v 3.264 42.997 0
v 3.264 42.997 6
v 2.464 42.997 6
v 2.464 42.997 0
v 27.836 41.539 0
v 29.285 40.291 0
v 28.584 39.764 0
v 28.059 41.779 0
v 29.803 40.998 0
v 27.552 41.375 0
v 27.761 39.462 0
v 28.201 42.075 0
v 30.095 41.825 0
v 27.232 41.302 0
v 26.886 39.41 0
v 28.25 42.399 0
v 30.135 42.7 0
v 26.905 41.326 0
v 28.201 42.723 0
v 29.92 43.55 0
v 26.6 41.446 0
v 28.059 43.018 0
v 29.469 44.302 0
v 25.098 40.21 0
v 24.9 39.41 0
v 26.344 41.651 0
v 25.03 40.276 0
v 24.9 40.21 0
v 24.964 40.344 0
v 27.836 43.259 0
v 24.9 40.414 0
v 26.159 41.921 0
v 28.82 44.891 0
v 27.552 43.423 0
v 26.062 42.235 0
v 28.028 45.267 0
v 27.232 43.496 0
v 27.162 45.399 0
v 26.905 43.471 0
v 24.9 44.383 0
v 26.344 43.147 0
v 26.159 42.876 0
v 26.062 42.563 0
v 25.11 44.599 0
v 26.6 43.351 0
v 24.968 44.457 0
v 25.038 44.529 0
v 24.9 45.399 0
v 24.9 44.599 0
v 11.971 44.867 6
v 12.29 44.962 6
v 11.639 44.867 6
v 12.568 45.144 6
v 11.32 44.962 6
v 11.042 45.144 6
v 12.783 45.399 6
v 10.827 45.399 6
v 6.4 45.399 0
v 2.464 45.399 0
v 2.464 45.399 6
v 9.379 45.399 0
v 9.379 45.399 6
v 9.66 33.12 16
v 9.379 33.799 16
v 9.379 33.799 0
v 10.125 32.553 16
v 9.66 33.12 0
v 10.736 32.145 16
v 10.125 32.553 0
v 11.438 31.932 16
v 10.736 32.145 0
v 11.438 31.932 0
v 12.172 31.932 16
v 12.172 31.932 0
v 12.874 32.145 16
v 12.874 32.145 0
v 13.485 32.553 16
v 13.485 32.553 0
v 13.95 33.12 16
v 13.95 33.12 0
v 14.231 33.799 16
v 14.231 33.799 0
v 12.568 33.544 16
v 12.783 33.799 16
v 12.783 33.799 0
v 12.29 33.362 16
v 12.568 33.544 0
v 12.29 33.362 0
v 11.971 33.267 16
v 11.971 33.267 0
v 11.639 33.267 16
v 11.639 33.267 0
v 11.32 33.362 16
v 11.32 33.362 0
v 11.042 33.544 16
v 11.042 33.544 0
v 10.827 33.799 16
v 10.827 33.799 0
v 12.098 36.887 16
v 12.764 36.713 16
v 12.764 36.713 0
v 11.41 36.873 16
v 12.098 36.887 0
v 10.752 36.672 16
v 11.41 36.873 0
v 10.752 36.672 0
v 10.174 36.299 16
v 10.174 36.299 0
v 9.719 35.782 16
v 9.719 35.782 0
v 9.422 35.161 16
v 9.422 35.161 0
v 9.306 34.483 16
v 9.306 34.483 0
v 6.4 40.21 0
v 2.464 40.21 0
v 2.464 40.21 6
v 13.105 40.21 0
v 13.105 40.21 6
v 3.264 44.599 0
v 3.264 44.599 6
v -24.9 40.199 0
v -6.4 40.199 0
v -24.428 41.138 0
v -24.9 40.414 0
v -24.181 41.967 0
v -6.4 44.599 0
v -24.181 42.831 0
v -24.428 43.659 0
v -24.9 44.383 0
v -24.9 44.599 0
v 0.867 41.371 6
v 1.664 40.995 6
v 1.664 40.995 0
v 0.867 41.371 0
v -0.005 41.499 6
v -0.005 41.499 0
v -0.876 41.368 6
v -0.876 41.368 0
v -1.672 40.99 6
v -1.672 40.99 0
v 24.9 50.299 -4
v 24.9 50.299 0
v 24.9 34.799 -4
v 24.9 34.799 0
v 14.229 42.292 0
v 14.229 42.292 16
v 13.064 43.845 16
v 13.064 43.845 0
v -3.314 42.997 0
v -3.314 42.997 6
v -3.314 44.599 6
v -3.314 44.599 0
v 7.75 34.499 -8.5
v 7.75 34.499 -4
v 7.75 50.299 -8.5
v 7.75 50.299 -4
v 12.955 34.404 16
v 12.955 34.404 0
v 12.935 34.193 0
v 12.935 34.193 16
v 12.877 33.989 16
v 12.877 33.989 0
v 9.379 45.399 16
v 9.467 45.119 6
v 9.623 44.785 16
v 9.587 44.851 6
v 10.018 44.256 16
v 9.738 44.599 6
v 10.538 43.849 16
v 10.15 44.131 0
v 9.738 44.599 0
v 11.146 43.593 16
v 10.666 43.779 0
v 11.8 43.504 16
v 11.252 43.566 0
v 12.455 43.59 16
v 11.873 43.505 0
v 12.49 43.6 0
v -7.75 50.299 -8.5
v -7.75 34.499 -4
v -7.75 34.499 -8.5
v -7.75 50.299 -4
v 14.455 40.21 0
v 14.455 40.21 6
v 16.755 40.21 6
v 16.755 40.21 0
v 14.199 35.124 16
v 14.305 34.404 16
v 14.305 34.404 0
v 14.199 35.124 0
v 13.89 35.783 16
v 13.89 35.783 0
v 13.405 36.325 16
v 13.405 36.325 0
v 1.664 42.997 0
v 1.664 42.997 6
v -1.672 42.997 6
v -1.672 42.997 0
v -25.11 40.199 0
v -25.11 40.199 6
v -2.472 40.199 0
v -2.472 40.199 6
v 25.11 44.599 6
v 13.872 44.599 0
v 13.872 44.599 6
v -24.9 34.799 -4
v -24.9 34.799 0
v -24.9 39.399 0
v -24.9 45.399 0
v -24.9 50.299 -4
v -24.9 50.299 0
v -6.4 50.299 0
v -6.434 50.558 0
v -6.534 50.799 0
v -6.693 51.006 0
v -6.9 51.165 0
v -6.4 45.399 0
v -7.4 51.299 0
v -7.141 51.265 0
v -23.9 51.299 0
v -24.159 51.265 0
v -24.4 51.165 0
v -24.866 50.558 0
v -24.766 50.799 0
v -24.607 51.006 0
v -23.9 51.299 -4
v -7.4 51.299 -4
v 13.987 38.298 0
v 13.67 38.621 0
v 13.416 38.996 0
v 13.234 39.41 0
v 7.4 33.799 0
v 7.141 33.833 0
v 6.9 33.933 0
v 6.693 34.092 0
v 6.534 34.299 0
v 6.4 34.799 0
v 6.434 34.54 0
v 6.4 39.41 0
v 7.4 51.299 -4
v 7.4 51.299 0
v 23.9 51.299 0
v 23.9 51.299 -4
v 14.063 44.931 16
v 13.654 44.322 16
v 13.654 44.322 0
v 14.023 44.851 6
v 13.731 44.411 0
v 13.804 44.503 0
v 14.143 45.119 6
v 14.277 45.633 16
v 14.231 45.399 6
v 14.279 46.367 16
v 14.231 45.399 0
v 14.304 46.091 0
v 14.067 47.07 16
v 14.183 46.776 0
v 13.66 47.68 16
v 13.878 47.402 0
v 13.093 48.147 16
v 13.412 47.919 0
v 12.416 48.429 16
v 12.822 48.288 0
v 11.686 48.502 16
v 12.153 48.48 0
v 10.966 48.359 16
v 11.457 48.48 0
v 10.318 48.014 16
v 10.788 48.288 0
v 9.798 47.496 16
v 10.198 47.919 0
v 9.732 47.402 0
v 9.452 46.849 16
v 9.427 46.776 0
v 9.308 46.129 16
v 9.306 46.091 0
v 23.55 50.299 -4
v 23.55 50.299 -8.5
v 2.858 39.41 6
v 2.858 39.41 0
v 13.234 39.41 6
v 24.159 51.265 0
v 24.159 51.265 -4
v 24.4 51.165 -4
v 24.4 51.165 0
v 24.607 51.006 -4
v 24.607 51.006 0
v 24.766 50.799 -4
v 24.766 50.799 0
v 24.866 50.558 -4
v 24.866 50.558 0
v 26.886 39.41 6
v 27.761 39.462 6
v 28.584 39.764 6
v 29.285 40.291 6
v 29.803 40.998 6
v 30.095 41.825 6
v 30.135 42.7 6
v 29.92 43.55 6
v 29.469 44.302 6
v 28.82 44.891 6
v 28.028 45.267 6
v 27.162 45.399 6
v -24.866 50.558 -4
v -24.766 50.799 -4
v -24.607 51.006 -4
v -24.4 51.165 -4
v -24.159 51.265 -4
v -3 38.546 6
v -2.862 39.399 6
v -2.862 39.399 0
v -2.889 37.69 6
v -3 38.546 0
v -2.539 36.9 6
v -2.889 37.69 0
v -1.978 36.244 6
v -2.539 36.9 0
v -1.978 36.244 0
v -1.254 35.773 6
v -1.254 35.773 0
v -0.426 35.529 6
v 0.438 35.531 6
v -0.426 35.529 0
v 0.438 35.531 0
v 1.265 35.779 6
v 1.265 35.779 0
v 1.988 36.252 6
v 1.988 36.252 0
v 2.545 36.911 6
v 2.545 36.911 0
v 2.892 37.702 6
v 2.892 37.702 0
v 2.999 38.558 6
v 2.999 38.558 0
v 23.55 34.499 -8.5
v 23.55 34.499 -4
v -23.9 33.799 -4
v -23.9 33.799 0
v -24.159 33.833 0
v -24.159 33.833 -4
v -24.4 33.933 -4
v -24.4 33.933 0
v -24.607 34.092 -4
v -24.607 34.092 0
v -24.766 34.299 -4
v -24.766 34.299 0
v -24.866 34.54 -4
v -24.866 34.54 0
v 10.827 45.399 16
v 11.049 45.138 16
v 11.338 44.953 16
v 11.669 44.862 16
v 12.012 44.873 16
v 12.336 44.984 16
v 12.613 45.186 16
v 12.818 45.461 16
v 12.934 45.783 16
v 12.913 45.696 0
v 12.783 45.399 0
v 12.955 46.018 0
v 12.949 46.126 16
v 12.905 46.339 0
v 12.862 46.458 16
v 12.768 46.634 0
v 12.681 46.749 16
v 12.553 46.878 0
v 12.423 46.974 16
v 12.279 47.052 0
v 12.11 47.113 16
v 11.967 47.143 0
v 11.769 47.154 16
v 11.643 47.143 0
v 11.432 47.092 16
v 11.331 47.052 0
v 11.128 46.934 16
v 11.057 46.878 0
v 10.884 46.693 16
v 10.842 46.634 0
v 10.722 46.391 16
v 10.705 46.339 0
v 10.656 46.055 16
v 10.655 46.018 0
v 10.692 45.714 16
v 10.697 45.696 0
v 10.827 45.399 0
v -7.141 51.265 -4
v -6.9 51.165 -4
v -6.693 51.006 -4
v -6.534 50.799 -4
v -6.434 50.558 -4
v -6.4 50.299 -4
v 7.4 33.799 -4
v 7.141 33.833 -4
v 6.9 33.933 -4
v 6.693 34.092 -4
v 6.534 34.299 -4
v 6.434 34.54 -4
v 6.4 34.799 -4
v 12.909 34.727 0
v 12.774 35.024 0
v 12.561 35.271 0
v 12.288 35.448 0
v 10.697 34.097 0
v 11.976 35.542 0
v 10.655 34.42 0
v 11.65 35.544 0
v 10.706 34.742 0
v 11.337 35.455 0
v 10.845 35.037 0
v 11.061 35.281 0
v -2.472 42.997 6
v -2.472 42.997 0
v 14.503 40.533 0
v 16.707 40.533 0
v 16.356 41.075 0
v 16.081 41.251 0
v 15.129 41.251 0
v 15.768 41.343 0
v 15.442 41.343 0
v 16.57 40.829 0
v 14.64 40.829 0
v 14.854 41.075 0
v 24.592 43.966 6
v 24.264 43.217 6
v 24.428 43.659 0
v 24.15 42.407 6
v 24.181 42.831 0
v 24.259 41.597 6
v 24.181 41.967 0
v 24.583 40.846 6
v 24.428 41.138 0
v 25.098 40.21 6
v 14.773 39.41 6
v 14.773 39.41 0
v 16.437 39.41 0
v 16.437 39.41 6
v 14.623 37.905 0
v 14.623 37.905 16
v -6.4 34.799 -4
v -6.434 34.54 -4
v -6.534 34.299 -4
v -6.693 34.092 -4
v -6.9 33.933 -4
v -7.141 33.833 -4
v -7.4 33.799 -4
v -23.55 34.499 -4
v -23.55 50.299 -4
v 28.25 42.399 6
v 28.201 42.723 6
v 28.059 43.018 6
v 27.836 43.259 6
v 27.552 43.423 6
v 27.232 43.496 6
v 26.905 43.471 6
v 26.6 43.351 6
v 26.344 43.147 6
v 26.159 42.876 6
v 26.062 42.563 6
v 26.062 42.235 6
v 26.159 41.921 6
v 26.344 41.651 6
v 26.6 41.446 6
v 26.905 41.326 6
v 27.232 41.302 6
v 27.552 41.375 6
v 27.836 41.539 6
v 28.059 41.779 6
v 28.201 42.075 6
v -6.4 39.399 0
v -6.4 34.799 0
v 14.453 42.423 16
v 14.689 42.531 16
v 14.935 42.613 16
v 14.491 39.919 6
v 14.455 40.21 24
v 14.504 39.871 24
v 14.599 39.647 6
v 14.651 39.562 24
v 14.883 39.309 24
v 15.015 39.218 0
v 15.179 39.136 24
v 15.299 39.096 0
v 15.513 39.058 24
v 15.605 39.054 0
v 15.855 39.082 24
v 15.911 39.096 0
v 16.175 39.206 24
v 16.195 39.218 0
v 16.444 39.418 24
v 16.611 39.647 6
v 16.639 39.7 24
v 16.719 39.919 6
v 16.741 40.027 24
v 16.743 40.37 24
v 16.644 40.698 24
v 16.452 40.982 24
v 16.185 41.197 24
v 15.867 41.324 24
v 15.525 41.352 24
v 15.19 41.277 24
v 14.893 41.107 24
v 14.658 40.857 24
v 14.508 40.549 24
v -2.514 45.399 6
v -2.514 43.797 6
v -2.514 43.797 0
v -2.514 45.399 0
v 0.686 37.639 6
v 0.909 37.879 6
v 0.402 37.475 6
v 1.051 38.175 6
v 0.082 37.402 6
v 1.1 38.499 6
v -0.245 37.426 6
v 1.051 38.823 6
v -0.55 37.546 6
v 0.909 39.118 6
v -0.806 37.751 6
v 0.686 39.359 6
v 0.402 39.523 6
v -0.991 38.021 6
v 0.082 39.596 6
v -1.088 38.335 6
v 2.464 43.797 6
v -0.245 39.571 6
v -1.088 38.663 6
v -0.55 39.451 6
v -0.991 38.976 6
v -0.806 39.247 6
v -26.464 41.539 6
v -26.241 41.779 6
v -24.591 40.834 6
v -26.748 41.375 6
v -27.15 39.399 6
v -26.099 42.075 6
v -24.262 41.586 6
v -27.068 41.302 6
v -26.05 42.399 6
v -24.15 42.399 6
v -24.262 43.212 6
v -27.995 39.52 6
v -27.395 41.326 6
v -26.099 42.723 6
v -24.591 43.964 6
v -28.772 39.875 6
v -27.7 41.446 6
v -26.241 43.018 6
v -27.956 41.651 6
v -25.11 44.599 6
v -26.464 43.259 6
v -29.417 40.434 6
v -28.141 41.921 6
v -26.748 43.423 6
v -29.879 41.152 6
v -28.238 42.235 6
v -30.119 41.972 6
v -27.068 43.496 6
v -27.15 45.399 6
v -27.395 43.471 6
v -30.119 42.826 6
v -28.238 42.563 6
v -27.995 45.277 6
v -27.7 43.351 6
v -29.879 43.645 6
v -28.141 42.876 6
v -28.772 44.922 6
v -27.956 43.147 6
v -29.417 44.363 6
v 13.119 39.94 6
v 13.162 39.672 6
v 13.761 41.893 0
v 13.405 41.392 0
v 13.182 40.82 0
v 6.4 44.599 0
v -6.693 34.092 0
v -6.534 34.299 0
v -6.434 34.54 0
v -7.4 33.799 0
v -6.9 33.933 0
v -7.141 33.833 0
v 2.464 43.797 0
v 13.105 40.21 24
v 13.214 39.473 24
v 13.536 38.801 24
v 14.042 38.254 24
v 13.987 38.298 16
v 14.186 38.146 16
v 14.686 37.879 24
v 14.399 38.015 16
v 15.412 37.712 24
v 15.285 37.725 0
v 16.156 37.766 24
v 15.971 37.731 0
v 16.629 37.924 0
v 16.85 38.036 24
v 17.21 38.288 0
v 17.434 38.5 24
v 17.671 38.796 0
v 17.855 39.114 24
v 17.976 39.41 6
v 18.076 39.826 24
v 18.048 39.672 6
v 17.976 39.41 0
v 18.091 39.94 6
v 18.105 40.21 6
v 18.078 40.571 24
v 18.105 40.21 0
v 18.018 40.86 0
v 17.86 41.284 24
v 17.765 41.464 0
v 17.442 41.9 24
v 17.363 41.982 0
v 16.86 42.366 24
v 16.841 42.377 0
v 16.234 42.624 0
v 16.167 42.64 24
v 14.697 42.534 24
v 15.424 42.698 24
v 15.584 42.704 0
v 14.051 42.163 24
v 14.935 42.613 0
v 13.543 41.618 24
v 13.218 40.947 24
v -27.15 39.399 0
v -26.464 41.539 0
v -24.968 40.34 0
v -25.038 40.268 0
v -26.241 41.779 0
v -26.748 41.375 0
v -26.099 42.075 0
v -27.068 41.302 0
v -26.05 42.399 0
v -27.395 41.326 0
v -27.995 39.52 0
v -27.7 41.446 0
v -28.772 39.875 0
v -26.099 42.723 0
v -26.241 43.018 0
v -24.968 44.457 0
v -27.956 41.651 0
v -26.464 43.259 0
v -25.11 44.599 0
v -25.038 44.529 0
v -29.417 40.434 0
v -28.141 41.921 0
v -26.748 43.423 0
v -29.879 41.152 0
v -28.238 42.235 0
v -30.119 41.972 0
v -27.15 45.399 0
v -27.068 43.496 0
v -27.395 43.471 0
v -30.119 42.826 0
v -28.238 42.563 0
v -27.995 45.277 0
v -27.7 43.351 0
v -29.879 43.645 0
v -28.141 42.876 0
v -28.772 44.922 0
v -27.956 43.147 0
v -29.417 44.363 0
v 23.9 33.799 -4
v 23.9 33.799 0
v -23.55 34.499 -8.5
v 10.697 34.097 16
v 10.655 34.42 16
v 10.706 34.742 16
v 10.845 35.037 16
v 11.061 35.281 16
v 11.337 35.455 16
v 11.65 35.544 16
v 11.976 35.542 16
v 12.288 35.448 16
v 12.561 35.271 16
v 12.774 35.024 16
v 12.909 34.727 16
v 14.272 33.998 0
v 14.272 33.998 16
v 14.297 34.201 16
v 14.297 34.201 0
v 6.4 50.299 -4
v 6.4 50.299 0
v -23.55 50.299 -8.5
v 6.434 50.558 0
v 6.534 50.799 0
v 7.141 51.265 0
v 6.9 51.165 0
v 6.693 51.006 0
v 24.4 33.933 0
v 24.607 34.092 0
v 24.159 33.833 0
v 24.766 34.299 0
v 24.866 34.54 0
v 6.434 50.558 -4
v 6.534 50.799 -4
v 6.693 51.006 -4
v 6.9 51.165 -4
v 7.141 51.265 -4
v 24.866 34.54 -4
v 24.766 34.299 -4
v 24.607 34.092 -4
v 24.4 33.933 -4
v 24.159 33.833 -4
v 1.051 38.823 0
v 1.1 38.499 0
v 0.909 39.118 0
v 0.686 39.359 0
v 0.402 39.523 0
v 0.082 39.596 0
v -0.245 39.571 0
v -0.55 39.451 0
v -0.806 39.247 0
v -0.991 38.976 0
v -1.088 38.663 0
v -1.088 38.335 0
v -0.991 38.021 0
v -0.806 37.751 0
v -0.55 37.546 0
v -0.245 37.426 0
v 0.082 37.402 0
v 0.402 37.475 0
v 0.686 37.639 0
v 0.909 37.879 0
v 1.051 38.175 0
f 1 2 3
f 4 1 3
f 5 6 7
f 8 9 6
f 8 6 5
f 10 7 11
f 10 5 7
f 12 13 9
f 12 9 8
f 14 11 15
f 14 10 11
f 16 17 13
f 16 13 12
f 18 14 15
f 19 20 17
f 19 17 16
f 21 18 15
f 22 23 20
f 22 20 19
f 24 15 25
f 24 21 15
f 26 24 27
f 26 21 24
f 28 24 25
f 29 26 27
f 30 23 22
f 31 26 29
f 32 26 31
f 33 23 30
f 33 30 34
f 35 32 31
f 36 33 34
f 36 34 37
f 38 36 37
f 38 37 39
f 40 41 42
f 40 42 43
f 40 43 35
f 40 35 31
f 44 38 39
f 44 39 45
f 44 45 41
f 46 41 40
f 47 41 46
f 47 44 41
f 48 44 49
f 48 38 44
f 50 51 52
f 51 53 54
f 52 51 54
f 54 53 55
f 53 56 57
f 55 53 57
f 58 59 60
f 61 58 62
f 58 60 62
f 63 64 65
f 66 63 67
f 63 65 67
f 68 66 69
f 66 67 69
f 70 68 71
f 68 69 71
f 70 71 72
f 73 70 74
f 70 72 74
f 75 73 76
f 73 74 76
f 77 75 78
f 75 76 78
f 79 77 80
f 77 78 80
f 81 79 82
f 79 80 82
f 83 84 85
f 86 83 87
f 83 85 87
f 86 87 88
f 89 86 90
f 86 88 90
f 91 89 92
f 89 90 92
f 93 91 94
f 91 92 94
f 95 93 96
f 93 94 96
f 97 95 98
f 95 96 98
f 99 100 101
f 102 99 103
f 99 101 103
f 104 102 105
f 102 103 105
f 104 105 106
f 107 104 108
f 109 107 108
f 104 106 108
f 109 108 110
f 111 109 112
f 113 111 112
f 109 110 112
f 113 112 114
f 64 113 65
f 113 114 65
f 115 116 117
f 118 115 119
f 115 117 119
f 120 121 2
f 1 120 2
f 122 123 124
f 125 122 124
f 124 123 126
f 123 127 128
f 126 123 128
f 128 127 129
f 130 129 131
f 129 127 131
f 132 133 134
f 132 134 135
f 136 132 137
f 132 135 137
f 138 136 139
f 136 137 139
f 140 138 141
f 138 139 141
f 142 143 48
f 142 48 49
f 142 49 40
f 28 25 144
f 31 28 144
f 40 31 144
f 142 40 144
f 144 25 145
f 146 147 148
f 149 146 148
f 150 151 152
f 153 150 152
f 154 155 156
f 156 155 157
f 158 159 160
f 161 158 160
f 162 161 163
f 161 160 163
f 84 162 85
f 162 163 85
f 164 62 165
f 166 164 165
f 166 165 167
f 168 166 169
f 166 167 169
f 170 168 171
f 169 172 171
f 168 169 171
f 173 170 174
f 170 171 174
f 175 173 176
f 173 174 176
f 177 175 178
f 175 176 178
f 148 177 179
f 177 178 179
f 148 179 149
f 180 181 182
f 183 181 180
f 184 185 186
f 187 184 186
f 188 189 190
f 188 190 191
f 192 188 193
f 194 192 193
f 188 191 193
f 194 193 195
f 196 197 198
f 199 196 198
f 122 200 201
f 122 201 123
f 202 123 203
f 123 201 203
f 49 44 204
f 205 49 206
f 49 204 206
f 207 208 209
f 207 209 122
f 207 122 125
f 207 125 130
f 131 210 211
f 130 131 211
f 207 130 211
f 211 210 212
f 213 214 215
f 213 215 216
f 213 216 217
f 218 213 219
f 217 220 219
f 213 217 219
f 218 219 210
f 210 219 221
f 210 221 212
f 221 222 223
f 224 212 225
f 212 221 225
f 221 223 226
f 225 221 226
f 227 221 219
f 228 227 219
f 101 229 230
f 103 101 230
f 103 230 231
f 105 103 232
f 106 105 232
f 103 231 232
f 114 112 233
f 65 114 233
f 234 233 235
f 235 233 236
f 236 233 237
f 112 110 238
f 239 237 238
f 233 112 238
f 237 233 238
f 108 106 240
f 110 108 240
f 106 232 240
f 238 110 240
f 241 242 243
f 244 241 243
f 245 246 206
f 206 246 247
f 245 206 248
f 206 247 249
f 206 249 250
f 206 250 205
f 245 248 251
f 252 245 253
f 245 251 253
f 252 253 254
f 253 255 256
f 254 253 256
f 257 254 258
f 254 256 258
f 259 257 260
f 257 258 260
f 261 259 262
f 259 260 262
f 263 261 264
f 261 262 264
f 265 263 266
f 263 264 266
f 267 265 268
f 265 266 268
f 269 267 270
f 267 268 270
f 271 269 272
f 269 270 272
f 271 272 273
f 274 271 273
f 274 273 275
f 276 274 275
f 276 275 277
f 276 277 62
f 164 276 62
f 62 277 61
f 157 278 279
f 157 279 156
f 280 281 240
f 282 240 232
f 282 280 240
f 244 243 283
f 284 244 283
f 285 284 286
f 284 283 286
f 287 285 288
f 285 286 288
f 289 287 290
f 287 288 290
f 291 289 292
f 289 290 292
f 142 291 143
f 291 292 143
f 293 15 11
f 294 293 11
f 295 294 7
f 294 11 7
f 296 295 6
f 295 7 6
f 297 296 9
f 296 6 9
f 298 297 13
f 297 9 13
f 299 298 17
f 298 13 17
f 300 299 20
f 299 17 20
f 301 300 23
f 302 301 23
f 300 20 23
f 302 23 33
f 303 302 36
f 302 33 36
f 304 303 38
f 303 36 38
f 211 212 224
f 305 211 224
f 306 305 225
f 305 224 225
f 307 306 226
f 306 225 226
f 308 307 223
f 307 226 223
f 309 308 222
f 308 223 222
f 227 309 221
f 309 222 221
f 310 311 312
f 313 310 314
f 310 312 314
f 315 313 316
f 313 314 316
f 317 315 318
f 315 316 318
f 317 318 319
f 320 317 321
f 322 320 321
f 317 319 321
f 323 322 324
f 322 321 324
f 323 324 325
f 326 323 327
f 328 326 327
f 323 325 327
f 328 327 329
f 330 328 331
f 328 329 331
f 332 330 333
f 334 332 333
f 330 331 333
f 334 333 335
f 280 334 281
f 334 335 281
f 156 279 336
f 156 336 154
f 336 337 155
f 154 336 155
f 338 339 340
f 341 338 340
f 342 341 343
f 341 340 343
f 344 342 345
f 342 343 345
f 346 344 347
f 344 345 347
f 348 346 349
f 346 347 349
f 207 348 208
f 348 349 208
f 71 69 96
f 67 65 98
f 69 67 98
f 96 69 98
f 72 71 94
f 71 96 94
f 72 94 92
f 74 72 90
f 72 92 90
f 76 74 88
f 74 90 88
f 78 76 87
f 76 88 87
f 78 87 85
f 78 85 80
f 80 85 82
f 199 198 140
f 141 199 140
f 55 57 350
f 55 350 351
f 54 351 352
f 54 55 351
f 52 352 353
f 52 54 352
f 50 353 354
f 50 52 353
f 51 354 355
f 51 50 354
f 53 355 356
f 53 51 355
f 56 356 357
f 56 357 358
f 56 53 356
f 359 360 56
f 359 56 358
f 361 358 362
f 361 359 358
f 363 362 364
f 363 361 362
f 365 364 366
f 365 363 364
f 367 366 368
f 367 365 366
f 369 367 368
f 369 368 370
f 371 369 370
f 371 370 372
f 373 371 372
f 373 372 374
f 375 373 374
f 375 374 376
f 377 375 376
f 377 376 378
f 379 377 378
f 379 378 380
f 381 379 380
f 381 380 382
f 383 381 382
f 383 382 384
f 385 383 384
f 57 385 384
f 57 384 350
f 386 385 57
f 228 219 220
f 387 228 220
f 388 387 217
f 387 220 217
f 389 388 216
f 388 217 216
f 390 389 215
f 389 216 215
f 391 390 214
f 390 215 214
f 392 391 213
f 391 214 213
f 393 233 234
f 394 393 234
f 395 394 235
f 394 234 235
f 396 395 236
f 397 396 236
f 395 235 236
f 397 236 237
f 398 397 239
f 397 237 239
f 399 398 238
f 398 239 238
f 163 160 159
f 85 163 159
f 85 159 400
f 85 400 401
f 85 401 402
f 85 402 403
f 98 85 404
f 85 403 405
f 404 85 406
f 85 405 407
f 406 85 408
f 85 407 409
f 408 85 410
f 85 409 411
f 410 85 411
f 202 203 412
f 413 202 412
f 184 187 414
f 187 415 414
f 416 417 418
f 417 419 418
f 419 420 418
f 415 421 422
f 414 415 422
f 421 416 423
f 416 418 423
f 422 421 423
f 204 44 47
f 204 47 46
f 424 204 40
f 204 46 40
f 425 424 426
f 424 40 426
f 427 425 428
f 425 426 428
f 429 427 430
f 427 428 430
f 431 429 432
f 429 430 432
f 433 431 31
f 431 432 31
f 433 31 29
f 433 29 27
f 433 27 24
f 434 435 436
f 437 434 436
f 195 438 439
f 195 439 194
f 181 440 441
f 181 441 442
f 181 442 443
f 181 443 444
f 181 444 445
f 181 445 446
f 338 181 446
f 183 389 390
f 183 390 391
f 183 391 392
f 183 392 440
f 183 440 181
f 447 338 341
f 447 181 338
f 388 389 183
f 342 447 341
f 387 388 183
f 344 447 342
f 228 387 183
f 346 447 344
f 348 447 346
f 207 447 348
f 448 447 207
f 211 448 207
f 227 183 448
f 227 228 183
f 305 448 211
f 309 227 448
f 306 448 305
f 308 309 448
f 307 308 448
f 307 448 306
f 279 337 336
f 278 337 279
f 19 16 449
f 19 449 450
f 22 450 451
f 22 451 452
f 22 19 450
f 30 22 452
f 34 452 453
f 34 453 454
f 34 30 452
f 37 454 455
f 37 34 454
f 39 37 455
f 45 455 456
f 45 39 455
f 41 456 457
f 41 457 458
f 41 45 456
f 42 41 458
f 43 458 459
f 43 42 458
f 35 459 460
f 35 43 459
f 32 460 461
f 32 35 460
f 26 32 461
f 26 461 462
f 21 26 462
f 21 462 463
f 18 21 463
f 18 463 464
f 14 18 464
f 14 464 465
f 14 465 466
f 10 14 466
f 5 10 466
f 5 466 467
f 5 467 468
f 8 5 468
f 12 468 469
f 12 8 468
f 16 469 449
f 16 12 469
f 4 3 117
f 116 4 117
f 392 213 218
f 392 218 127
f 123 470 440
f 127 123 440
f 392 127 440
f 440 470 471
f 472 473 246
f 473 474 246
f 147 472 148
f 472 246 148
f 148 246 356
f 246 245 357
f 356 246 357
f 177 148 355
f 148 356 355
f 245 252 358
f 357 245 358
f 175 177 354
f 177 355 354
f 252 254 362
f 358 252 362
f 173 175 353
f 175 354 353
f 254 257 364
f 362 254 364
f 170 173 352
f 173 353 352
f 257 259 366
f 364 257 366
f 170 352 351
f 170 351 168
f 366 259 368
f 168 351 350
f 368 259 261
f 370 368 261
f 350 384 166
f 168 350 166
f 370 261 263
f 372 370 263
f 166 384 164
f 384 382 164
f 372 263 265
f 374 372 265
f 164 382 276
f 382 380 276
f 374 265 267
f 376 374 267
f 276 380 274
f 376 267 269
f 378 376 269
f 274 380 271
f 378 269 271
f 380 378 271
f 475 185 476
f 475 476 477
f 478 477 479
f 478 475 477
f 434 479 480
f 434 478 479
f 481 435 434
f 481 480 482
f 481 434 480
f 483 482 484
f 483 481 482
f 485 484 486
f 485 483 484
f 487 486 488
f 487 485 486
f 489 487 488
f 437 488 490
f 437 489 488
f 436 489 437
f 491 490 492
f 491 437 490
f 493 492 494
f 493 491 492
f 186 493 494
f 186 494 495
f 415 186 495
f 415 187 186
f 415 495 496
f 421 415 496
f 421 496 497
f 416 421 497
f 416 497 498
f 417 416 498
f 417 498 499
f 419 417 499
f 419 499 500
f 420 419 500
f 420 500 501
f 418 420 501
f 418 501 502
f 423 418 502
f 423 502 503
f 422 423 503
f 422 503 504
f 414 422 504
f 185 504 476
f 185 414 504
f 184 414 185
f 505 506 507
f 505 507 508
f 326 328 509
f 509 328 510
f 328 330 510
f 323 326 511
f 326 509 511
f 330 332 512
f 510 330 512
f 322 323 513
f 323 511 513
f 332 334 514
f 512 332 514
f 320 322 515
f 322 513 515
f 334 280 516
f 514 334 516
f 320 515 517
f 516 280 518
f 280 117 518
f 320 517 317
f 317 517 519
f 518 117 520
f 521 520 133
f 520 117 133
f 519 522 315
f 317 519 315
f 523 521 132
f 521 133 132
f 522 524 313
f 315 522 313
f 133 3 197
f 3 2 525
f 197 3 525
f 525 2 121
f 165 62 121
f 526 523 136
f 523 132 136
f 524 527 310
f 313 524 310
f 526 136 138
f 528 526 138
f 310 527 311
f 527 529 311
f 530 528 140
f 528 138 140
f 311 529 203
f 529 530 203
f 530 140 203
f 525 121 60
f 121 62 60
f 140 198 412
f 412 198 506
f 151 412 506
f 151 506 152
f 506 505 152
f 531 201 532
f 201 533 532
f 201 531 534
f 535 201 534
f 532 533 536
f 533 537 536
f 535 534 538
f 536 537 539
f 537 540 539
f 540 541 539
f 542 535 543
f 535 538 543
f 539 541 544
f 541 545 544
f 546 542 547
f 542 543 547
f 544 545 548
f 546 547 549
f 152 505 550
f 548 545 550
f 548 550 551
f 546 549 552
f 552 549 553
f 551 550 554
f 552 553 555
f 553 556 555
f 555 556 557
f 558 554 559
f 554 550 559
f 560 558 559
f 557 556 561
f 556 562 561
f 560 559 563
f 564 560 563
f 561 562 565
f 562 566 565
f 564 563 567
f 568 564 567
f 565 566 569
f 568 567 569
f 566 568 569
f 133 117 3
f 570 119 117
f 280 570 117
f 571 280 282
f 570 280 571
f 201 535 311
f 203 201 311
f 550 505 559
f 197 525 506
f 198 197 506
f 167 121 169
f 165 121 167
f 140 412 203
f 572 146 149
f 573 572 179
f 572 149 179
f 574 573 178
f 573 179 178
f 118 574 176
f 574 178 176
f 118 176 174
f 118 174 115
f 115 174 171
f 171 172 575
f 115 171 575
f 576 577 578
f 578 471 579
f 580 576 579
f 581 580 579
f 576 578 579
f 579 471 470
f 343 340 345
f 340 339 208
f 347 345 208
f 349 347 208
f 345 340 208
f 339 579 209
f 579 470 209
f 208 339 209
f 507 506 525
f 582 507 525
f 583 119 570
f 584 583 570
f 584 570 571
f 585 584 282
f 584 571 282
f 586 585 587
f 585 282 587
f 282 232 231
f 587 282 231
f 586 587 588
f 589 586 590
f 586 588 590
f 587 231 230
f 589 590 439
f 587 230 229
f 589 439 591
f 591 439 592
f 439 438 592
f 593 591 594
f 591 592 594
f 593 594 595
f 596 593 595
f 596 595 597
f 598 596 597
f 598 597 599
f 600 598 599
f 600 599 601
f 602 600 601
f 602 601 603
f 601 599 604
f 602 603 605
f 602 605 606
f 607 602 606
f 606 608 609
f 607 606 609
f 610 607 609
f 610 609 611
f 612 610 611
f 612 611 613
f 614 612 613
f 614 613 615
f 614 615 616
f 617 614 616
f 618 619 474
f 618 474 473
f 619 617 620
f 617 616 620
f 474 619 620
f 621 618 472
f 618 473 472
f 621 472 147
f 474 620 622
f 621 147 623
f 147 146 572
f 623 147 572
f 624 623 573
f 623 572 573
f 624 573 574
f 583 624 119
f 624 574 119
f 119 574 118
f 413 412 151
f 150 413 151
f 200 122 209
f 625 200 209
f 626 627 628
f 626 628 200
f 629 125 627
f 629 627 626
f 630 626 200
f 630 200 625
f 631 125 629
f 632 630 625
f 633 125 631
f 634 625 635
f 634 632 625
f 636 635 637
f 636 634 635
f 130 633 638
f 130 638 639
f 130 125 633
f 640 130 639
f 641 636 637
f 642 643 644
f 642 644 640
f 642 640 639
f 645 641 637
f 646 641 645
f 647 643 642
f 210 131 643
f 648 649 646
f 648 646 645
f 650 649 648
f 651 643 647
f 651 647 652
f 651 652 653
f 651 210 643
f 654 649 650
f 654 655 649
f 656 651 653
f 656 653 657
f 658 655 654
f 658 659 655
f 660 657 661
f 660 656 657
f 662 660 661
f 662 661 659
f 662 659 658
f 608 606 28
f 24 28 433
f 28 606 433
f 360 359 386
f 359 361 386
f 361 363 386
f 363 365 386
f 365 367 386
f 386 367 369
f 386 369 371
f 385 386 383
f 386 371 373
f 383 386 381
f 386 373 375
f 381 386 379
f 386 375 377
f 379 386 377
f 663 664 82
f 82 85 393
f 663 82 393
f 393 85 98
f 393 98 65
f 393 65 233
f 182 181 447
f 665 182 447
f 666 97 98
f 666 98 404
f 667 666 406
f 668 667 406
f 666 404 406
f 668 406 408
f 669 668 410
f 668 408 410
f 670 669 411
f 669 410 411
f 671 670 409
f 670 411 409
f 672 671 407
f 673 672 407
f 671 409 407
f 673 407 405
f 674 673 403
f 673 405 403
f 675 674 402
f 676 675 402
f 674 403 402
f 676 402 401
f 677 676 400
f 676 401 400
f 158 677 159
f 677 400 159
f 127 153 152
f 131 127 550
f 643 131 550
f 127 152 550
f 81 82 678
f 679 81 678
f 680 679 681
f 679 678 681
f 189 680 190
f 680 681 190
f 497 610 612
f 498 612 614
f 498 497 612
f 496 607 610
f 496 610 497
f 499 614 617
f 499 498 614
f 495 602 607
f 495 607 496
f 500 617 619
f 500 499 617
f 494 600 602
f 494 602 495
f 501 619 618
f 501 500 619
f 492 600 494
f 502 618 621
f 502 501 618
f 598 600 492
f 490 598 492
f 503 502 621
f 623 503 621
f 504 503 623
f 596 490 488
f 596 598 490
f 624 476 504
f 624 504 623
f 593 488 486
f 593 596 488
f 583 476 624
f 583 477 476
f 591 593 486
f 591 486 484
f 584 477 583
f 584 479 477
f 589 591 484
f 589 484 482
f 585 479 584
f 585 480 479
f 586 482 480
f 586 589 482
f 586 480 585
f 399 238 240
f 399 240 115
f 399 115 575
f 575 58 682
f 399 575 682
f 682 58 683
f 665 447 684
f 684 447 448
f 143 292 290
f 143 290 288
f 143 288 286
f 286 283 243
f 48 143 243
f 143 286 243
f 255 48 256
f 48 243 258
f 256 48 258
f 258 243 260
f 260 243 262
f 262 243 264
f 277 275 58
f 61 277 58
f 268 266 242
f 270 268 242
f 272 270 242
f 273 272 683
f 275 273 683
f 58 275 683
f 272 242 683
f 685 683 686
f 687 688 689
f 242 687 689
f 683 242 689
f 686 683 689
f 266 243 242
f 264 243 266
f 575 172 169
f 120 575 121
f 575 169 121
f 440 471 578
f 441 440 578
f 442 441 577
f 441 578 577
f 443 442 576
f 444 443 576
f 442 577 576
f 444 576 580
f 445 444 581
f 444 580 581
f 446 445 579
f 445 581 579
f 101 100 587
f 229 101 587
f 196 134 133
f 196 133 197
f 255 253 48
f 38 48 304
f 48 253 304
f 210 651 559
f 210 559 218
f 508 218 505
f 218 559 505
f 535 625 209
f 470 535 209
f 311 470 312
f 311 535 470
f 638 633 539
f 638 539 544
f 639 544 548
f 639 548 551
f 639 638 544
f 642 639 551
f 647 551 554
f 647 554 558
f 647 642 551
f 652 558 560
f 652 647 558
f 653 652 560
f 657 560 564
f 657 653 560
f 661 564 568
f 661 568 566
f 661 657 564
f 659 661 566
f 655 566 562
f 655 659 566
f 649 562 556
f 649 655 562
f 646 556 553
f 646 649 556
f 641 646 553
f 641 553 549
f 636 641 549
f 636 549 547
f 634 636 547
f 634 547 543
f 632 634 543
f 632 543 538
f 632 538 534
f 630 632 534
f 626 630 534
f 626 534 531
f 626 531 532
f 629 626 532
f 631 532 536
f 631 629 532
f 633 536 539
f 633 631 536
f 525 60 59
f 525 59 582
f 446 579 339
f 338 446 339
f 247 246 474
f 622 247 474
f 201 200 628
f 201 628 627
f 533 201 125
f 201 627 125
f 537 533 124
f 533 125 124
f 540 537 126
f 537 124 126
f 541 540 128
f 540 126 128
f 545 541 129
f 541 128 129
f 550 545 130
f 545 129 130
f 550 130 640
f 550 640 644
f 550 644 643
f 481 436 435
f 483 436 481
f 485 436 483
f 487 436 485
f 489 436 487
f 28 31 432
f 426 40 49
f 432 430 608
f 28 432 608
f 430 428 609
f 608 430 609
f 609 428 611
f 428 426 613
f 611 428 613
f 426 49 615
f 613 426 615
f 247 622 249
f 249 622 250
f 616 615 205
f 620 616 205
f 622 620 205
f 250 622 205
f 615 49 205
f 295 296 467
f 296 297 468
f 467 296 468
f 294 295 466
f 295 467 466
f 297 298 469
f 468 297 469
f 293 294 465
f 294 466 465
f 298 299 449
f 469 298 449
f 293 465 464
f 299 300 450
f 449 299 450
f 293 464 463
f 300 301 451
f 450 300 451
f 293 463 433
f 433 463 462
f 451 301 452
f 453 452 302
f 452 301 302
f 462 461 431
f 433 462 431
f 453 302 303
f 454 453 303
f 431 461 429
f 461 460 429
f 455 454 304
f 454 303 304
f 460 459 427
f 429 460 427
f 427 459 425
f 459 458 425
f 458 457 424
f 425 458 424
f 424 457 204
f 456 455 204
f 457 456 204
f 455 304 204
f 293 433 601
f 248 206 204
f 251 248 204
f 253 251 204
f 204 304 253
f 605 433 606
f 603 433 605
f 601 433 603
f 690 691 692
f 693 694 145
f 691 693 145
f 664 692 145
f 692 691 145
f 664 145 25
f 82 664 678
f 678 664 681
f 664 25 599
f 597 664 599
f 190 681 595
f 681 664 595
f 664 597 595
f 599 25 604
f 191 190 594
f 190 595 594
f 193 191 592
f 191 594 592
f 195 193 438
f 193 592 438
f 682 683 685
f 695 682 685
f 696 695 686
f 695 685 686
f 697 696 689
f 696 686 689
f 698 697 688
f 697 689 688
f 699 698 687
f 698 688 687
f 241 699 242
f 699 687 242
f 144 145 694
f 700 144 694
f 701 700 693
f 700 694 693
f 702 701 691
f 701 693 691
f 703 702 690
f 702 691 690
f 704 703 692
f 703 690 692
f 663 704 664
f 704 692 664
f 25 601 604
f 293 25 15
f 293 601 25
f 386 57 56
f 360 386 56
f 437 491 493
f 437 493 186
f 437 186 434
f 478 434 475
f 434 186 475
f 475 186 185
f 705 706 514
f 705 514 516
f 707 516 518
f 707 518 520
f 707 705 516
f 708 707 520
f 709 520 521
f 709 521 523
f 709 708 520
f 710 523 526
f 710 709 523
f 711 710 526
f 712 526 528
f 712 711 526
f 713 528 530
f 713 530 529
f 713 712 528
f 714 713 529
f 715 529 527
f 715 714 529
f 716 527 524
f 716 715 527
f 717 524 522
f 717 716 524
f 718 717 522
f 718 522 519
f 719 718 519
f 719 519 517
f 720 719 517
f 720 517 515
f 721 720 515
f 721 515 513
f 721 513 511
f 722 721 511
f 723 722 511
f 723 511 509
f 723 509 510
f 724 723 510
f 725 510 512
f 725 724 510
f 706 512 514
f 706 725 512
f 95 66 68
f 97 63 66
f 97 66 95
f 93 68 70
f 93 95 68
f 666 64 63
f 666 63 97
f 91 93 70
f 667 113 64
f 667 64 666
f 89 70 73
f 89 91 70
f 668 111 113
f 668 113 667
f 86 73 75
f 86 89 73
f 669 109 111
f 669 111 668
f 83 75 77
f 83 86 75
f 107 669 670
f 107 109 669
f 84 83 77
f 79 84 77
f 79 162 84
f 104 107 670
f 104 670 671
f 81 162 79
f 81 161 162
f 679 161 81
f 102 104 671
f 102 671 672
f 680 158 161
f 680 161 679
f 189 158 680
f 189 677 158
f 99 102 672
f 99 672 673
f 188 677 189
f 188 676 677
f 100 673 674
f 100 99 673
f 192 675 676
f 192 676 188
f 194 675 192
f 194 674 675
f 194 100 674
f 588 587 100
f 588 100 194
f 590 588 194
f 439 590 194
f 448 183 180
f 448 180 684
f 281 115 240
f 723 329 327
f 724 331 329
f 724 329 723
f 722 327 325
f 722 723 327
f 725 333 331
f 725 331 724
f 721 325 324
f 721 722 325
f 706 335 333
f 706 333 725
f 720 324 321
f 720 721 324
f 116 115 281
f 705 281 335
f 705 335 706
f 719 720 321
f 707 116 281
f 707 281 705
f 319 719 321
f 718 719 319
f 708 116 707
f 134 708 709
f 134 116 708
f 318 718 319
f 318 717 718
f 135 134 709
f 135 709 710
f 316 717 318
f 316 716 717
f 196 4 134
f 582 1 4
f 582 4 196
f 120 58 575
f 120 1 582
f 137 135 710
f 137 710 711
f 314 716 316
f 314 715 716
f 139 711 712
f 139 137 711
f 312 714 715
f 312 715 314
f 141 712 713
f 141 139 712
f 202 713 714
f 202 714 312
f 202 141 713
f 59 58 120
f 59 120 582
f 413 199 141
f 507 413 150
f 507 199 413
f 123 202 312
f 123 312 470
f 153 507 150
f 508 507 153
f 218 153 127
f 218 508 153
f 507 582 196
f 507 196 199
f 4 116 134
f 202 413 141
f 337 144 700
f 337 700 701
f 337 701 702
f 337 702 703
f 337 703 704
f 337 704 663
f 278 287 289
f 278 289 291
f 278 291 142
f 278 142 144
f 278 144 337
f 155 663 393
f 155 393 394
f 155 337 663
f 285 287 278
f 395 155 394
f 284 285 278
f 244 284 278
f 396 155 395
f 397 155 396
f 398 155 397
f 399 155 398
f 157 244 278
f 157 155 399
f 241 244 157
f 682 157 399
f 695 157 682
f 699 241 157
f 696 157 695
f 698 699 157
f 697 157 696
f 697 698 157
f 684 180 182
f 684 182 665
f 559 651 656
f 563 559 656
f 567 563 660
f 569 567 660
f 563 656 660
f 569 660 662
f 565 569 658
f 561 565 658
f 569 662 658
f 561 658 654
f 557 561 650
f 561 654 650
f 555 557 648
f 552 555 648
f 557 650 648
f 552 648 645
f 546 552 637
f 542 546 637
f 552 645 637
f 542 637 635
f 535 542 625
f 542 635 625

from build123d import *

# Parameters (mm, degrees)
ESQUISSE1_R        = 3
ESQUISSE1_R_2      = 1.1
EXTRUSION1_DEPTH   = 6
EXTRUSION1_2_DEPTH = 6
EXTRUSION1_3_DEPTH = 6
EXTRUSION2_DEPTH   = 6
ESQUISSE3_W        = 15.8
ESQUISSE3_H        = 15.8
EXTRUSION3_DEPTH   = 8.5
EXTRUSION4_DEPTH   = 4
ESQUISSE5_R        = 2.5
ESQUISSE5_R_2      = 1.15
EXTRUSION5_DEPTH   = 24
ESQUISSE6_R        = 2.5
ESQUISSE6_R_2      = 1.15
EXTRUSION6_DEPTH   = 16
EXTRUSION7_DEPTH   = 16


with BuildPart() as part:
    # Esquisse1 → Extrusion1 (new body)
    with BuildSketch(Plane.XY):
        with Locations((-27.15, 42.398738828)):
            Circle(ESQUISSE1_R)
        with Locations((-27.15, 42.398738828)):
            Circle(ESQUISSE1_R_2, mode=Mode.SUBTRACT)
    extrude(amount=EXTRUSION1_DEPTH)



with BuildPart() as body_2:
    # Esquisse1 → Extrusion1 2 (new body)
    with BuildSketch(Plane.XY):
        with Locations((0, 38.498738828)):
            Circle(ESQUISSE1_R)
        with Locations((0, 38.498738828)):
            Circle(ESQUISSE1_R_2, mode=Mode.SUBTRACT)
    extrude(amount=EXTRUSION1_2_DEPTH)


with BuildPart() as body_3:
    # Esquisse1 → Extrusion1 3 (new body)
    with BuildSketch(Plane.XY):
        with Locations((27.15, 42.398738828)):
            Circle(ESQUISSE1_R)
        with Locations((27.15, 42.398738828)):
            Circle(ESQUISSE1_R_2, mode=Mode.SUBTRACT)
    extrude(amount=EXTRUSION1_3_DEPTH)


with BuildPart() as part_1:
    add(part.part)

    add(body_2.part)  # Extrusion2 merges body 2

    add(body_3.part)  # Extrusion2 merges body 3
    # Esquisse2 → Extrusion2 (add)
    with BuildSketch(Plane.XY.offset(6)):
        Polygon((-27.15, 45.398738828), (-2.513675589, 45.398738828), (-2.513675589, 44.598738828), (-2.513675589, 43.7970137), (2.463807407, 43.7970137), (2.463807407, 44.724328248), (2.463807407, 45.398738828), (27.161568979, 45.398738828), (27.161568979, 44.598738828), (3.263807407, 44.598738828), (3.263807407, 42.9970137), (2.463807407, 42.9970137), (2.463807407, 40.21036176), (27.413822862, 40.21036176), (27.413822862, 39.41036176), (2.20772744, 39.41036176), (1.663807407, 39.41036176), (1.663807407, 42.9970137), (-1.671841419, 42.9970137), (-1.671841419, 39.398738828), (-2.471841419, 39.398738828), (-27.15, 39.398738828), (-27.15, 40.198738828), (-2.471841419, 40.198738828), (-2.471841419, 42.9970137), (-3.313675589, 42.9970137), (-3.313675589, 44.598738828), (-27.15, 44.598738828), align=None)
    extrude(amount=-EXTRUSION2_DEPTH)

    # Esquisse3 → Extrusion3 (add)
    with BuildSketch(Plane(origin=(0, 0, 0), x_dir=(-1, 0, 0), z_dir=(0, 0, -1))):
        with Locations((15.65, 42.398738828)):
            Rectangle(ESQUISSE3_W, ESQUISSE3_H)
        with Locations((-15.65, 42.398738828)):
            Rectangle(ESQUISSE3_W, ESQUISSE3_H)
    extrude(amount=EXTRUSION3_DEPTH)

    # Esquisse4 → Extrusion4 (add)
    with BuildSketch(Plane(origin=(0, 0, 0), x_dir=(-1, 0, 0), z_dir=(0, 0, -1))):
        with BuildLine():
            Line((7.4, 33.798738828), (23.9, 33.798738828))
            ThreePointArc((23.9, 33.798738828), (24.607106781, 34.091632046), (24.9, 34.798738828))
            Line((24.9, 34.798738828), (24.9, 50.298738828))
            ThreePointArc((24.9, 50.298738828), (24.607106781, 51.005845609), (23.9, 51.298738828))
            Line((23.9, 51.298738828), (7.4, 51.298738828))
            ThreePointArc((7.4, 51.298738828), (6.692893219, 51.005845609), (6.4, 50.298738828))
            Line((6.4, 50.298738828), (6.4, 34.798738828))
            ThreePointArc((6.4, 34.798738828), (6.692893219, 34.091632046), (7.4, 33.798738828))
        make_face()
        with BuildLine():
            Line((-6.4, 34.798738828), (-6.4, 50.298738828))
            ThreePointArc((-6.4, 50.298738828), (-6.692893219, 51.005845609), (-7.4, 51.298738828))
            Line((-7.4, 51.298738828), (-23.9, 51.298738828))
            ThreePointArc((-23.9, 51.298738828), (-24.607106781, 51.005845609), (-24.9, 50.298738828))
            Line((-24.9, 50.298738828), (-24.9, 34.798738828))
            ThreePointArc((-24.9, 34.798738828), (-24.607106781, 34.091632046), (-23.9, 33.798738828))
            Line((-23.9, 33.798738828), (-7.4, 33.798738828))
            ThreePointArc((-7.4, 33.798738828), (-6.692893219, 34.091632046), (-6.4, 34.798738828))
        make_face()
    extrude(amount=EXTRUSION4_DEPTH)

    # Esquisse5 → Extrusion5 (add)
    with BuildSketch(Plane.XY):
        with Locations(Location((15.605002706, 40.204414181, 0), (0, 0, 179.863691409))):
            Circle(ESQUISSE5_R)
        with Locations(Location((15.605002706, 40.204414181, 0), (0, 0, 179.703675934))):
            Circle(ESQUISSE5_R_2, mode=Mode.SUBTRACT)
    extrude(amount=EXTRUSION5_DEPTH)

    # Esquisse6 → Extrusion6 (add)
    # profile 1 of 5: a face of its own
    with BuildSketch(Plane.XY):
        with BuildLine():
            ThreePointArc((10.827425412, 33.798738828), (11.490132803, 35.510468856), (12.955002706, 34.404414181))
            ThreePointArc((12.955002706, 34.404414181), (12.911057381, 34.089544278), (12.78258, 33.798738828))
            Line((12.78258, 33.798738828), (14.230524787, 33.798738828))
            ThreePointArc((14.230524787, 33.798738828), (14.286313368, 34.099295518), (14.305002706, 34.404414181))
            ThreePointArc((14.305002706, 34.404414181), (11.499884043, 36.885724843), (9.379480625, 33.798738828))
            Line((9.379480625, 33.798738828), (10.827425412, 33.798738828))
        make_face()
    # profile 2 of 5: a face of its own
    with BuildSketch(Plane.XY):
        with BuildLine():
            ThreePointArc((12.78258, 33.798738828), (11.805002706, 33.254414181), (10.827425412, 33.798738828))
            Line((10.827425412, 33.798738828), (9.379480625, 33.798738828))
            ThreePointArc((9.379480625, 33.798738828), (11.805002706, 31.904414181), (14.230524787, 33.798738828))
            Line((14.230524787, 33.798738828), (12.78258, 33.798738828))
        make_face()
    # profile 3 of 5: a face of its own
    with BuildSketch(Plane.XY):
        with BuildLine():
            ThreePointArc((10.827425412, 33.798738828), (11.490132803, 35.510468856), (12.955002706, 34.404414181))
            ThreePointArc((12.955002706, 34.404414181), (12.911057381, 34.089544278), (12.78258, 33.798738828))
            Line((12.78258, 33.798738828), (14.230524787, 33.798738828))
            ThreePointArc((14.230524787, 33.798738828), (14.286313368, 34.099295518), (14.305002706, 34.404414181))
            ThreePointArc((14.305002706, 34.404414181), (11.499884043, 36.885724843), (9.379480625, 33.798738828))
            Line((9.379480625, 33.798738828), (10.827425412, 33.798738828))
        make_face()
    # profile 4 of 5: a face of its own
    with BuildSketch(Plane.XY):
        with BuildLine():
            ThreePointArc((12.78258, 33.798738828), (11.805002706, 33.254414181), (10.827425412, 33.798738828))
            Line((10.827425412, 33.798738828), (9.379480625, 33.798738828))
            ThreePointArc((9.379480625, 33.798738828), (11.805002706, 31.904414181), (14.230524787, 33.798738828))
            Line((14.230524787, 33.798738828), (12.78258, 33.798738828))
        make_face()
    # profile 5 of 5: a face of its own
    with BuildSketch(Plane.XY):
        with Locations(Location((11.805002706, 46.004414181, 0), (0, 0, 194.020564777))):
            Circle(ESQUISSE6_R)
        with Locations(Location((11.805002706, 46.004414181, 0), (0, 0, 211.781019499))):
            Circle(ESQUISSE6_R_2, mode=Mode.SUBTRACT)
    extrude(amount=EXTRUSION6_DEPTH)

    # Esquisse7 → Extrusion7 (add)
    with BuildSketch(Plane.XY.offset(16)):
        Polygon((12.558485139, 36.446515131), (14.292905081, 38.694837279), (14.882025317, 38.240373098), (12.955002706, 35.742380824), align=None)
        Polygon((13.393576222, 44.668950414), (15.320709492, 42.099439388), (14.71430489, 41.644635937), (12.955002706, 43.990372182), align=None)
    extrude(amount=-EXTRUSION7_DEPTH)


solid = part_1.part
